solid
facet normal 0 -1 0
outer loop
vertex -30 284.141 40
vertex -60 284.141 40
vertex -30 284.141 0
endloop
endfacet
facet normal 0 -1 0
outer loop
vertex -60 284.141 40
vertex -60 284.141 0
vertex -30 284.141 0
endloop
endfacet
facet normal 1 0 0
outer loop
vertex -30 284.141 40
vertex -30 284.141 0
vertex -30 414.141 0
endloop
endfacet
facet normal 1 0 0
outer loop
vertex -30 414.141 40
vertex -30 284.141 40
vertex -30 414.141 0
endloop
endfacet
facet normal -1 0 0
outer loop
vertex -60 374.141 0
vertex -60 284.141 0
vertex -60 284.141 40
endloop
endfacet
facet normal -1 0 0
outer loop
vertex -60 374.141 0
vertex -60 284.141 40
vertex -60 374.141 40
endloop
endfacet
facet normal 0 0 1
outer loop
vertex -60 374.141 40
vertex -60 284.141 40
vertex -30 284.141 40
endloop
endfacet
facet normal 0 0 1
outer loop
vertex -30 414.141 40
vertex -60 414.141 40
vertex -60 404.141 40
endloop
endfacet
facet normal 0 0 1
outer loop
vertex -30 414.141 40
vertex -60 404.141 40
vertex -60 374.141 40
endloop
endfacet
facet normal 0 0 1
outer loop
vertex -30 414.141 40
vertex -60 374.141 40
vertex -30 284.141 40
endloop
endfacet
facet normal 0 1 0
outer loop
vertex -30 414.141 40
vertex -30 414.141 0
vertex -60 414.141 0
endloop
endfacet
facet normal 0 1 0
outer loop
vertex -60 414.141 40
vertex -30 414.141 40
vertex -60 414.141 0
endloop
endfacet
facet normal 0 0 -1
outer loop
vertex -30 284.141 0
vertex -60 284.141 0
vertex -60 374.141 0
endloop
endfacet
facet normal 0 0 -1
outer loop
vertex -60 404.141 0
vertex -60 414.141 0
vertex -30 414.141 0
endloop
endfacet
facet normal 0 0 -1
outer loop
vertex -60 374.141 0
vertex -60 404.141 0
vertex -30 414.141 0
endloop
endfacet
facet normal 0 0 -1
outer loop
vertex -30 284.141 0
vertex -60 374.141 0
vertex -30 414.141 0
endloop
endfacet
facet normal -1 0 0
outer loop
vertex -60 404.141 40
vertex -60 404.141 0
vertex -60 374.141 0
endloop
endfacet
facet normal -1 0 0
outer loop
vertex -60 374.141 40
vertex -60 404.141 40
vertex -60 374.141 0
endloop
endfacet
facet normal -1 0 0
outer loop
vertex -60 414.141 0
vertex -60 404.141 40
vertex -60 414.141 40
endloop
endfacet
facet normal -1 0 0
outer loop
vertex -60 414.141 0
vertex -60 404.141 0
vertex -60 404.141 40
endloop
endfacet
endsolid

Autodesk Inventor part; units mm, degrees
ref_plane "YZ Plane" through (0, 0, 0) normal (1, 0, 0) x (0, 1, 0)
ref_plane "XZ Plane" through (0, 0, 0) normal (0, 1, 0) x (-1, 0, 0)
ref_plane "XY Plane" through (0, 0, 0) normal (0, 0, 1) x (1, 0, 0)
ref_plane "Work Plane1" through (0, 0, 0) normal (0, 0, 1) x (1, 0, 0)
sketch "Sketch1" plane through (0, 0, 0) normal (0, 0, 1) x (1, 0, 0)
  line L0 (-90, 404.1414) -> (-60, 404.1414) projected
  line L1 (-60, 404.1414) -> (-60, 434.1414) projected
  line L2 (-60, 434.1414) -> (-90, 434.1414) projected
  line L3 (-90, 434.1414) -> (-90, 404.1414) projected
  line L4 (-60, 734.2829) -> (-60, 762.2829)
  line L5 (-60, 284.1414) -> (-60, 374.1414) projected
  line L6 (-60, 374.1414) -> (-60, 404.1414) construction
  line L7 (-60, 284.1414) -> (-90, 284.1414) construction
  spline S0 degree 3 poles (-10, 350) (-10, 360.2589) (-10.8658, 370.3929) (-14.4668, 392.6865) (-17.5742, 404.4656) (-26.8496, 431.6444) (-33.7108, 445.9172) (-45.2886, 465.4296) (-50.0022, 472.1002) (-55.3711, 478.3258) (-56.2225, 479.2687) (-59.645, 482.8719) (-62.119, 485.0608) (-66.6024, 488.033) (-68.2627, 488.7862) (-70.2419, 489.4323) (-70.852, 489.5961) (-71.4777, 489.7181) knots 0.305224 0.305224 0.305224 0.305224 0.919495 0.919495 1.689795 1.689795 2.84097 2.84097 3.625871 3.625871 3.775317 3.775317 4.231595 4.231595 4.59332 4.59332 4.735389 4.735389 4.735389 4.735389 projected
  line L8 (-10, -490) -> (-10, 350) projected
  line L9 (-60, 284.1414) -> (-30, 284.1414)
  line L10 (-30, 284.1414) -> (-30, 414.1414)
  line L11 (-30, 414.1414) -> (-60, 414.1414)
  line L12 (-60, 414.1414) -> (-60, 284.1414)
  point P0 (0, 0)
  dimension "d0" = 30
  dimension "d1" = 130
extrude "Extrusion1" add sketch "Sketch1" along normal blind 40 contours L1 L11 L10 L9 L5 L12
properties part number "Avionics"
